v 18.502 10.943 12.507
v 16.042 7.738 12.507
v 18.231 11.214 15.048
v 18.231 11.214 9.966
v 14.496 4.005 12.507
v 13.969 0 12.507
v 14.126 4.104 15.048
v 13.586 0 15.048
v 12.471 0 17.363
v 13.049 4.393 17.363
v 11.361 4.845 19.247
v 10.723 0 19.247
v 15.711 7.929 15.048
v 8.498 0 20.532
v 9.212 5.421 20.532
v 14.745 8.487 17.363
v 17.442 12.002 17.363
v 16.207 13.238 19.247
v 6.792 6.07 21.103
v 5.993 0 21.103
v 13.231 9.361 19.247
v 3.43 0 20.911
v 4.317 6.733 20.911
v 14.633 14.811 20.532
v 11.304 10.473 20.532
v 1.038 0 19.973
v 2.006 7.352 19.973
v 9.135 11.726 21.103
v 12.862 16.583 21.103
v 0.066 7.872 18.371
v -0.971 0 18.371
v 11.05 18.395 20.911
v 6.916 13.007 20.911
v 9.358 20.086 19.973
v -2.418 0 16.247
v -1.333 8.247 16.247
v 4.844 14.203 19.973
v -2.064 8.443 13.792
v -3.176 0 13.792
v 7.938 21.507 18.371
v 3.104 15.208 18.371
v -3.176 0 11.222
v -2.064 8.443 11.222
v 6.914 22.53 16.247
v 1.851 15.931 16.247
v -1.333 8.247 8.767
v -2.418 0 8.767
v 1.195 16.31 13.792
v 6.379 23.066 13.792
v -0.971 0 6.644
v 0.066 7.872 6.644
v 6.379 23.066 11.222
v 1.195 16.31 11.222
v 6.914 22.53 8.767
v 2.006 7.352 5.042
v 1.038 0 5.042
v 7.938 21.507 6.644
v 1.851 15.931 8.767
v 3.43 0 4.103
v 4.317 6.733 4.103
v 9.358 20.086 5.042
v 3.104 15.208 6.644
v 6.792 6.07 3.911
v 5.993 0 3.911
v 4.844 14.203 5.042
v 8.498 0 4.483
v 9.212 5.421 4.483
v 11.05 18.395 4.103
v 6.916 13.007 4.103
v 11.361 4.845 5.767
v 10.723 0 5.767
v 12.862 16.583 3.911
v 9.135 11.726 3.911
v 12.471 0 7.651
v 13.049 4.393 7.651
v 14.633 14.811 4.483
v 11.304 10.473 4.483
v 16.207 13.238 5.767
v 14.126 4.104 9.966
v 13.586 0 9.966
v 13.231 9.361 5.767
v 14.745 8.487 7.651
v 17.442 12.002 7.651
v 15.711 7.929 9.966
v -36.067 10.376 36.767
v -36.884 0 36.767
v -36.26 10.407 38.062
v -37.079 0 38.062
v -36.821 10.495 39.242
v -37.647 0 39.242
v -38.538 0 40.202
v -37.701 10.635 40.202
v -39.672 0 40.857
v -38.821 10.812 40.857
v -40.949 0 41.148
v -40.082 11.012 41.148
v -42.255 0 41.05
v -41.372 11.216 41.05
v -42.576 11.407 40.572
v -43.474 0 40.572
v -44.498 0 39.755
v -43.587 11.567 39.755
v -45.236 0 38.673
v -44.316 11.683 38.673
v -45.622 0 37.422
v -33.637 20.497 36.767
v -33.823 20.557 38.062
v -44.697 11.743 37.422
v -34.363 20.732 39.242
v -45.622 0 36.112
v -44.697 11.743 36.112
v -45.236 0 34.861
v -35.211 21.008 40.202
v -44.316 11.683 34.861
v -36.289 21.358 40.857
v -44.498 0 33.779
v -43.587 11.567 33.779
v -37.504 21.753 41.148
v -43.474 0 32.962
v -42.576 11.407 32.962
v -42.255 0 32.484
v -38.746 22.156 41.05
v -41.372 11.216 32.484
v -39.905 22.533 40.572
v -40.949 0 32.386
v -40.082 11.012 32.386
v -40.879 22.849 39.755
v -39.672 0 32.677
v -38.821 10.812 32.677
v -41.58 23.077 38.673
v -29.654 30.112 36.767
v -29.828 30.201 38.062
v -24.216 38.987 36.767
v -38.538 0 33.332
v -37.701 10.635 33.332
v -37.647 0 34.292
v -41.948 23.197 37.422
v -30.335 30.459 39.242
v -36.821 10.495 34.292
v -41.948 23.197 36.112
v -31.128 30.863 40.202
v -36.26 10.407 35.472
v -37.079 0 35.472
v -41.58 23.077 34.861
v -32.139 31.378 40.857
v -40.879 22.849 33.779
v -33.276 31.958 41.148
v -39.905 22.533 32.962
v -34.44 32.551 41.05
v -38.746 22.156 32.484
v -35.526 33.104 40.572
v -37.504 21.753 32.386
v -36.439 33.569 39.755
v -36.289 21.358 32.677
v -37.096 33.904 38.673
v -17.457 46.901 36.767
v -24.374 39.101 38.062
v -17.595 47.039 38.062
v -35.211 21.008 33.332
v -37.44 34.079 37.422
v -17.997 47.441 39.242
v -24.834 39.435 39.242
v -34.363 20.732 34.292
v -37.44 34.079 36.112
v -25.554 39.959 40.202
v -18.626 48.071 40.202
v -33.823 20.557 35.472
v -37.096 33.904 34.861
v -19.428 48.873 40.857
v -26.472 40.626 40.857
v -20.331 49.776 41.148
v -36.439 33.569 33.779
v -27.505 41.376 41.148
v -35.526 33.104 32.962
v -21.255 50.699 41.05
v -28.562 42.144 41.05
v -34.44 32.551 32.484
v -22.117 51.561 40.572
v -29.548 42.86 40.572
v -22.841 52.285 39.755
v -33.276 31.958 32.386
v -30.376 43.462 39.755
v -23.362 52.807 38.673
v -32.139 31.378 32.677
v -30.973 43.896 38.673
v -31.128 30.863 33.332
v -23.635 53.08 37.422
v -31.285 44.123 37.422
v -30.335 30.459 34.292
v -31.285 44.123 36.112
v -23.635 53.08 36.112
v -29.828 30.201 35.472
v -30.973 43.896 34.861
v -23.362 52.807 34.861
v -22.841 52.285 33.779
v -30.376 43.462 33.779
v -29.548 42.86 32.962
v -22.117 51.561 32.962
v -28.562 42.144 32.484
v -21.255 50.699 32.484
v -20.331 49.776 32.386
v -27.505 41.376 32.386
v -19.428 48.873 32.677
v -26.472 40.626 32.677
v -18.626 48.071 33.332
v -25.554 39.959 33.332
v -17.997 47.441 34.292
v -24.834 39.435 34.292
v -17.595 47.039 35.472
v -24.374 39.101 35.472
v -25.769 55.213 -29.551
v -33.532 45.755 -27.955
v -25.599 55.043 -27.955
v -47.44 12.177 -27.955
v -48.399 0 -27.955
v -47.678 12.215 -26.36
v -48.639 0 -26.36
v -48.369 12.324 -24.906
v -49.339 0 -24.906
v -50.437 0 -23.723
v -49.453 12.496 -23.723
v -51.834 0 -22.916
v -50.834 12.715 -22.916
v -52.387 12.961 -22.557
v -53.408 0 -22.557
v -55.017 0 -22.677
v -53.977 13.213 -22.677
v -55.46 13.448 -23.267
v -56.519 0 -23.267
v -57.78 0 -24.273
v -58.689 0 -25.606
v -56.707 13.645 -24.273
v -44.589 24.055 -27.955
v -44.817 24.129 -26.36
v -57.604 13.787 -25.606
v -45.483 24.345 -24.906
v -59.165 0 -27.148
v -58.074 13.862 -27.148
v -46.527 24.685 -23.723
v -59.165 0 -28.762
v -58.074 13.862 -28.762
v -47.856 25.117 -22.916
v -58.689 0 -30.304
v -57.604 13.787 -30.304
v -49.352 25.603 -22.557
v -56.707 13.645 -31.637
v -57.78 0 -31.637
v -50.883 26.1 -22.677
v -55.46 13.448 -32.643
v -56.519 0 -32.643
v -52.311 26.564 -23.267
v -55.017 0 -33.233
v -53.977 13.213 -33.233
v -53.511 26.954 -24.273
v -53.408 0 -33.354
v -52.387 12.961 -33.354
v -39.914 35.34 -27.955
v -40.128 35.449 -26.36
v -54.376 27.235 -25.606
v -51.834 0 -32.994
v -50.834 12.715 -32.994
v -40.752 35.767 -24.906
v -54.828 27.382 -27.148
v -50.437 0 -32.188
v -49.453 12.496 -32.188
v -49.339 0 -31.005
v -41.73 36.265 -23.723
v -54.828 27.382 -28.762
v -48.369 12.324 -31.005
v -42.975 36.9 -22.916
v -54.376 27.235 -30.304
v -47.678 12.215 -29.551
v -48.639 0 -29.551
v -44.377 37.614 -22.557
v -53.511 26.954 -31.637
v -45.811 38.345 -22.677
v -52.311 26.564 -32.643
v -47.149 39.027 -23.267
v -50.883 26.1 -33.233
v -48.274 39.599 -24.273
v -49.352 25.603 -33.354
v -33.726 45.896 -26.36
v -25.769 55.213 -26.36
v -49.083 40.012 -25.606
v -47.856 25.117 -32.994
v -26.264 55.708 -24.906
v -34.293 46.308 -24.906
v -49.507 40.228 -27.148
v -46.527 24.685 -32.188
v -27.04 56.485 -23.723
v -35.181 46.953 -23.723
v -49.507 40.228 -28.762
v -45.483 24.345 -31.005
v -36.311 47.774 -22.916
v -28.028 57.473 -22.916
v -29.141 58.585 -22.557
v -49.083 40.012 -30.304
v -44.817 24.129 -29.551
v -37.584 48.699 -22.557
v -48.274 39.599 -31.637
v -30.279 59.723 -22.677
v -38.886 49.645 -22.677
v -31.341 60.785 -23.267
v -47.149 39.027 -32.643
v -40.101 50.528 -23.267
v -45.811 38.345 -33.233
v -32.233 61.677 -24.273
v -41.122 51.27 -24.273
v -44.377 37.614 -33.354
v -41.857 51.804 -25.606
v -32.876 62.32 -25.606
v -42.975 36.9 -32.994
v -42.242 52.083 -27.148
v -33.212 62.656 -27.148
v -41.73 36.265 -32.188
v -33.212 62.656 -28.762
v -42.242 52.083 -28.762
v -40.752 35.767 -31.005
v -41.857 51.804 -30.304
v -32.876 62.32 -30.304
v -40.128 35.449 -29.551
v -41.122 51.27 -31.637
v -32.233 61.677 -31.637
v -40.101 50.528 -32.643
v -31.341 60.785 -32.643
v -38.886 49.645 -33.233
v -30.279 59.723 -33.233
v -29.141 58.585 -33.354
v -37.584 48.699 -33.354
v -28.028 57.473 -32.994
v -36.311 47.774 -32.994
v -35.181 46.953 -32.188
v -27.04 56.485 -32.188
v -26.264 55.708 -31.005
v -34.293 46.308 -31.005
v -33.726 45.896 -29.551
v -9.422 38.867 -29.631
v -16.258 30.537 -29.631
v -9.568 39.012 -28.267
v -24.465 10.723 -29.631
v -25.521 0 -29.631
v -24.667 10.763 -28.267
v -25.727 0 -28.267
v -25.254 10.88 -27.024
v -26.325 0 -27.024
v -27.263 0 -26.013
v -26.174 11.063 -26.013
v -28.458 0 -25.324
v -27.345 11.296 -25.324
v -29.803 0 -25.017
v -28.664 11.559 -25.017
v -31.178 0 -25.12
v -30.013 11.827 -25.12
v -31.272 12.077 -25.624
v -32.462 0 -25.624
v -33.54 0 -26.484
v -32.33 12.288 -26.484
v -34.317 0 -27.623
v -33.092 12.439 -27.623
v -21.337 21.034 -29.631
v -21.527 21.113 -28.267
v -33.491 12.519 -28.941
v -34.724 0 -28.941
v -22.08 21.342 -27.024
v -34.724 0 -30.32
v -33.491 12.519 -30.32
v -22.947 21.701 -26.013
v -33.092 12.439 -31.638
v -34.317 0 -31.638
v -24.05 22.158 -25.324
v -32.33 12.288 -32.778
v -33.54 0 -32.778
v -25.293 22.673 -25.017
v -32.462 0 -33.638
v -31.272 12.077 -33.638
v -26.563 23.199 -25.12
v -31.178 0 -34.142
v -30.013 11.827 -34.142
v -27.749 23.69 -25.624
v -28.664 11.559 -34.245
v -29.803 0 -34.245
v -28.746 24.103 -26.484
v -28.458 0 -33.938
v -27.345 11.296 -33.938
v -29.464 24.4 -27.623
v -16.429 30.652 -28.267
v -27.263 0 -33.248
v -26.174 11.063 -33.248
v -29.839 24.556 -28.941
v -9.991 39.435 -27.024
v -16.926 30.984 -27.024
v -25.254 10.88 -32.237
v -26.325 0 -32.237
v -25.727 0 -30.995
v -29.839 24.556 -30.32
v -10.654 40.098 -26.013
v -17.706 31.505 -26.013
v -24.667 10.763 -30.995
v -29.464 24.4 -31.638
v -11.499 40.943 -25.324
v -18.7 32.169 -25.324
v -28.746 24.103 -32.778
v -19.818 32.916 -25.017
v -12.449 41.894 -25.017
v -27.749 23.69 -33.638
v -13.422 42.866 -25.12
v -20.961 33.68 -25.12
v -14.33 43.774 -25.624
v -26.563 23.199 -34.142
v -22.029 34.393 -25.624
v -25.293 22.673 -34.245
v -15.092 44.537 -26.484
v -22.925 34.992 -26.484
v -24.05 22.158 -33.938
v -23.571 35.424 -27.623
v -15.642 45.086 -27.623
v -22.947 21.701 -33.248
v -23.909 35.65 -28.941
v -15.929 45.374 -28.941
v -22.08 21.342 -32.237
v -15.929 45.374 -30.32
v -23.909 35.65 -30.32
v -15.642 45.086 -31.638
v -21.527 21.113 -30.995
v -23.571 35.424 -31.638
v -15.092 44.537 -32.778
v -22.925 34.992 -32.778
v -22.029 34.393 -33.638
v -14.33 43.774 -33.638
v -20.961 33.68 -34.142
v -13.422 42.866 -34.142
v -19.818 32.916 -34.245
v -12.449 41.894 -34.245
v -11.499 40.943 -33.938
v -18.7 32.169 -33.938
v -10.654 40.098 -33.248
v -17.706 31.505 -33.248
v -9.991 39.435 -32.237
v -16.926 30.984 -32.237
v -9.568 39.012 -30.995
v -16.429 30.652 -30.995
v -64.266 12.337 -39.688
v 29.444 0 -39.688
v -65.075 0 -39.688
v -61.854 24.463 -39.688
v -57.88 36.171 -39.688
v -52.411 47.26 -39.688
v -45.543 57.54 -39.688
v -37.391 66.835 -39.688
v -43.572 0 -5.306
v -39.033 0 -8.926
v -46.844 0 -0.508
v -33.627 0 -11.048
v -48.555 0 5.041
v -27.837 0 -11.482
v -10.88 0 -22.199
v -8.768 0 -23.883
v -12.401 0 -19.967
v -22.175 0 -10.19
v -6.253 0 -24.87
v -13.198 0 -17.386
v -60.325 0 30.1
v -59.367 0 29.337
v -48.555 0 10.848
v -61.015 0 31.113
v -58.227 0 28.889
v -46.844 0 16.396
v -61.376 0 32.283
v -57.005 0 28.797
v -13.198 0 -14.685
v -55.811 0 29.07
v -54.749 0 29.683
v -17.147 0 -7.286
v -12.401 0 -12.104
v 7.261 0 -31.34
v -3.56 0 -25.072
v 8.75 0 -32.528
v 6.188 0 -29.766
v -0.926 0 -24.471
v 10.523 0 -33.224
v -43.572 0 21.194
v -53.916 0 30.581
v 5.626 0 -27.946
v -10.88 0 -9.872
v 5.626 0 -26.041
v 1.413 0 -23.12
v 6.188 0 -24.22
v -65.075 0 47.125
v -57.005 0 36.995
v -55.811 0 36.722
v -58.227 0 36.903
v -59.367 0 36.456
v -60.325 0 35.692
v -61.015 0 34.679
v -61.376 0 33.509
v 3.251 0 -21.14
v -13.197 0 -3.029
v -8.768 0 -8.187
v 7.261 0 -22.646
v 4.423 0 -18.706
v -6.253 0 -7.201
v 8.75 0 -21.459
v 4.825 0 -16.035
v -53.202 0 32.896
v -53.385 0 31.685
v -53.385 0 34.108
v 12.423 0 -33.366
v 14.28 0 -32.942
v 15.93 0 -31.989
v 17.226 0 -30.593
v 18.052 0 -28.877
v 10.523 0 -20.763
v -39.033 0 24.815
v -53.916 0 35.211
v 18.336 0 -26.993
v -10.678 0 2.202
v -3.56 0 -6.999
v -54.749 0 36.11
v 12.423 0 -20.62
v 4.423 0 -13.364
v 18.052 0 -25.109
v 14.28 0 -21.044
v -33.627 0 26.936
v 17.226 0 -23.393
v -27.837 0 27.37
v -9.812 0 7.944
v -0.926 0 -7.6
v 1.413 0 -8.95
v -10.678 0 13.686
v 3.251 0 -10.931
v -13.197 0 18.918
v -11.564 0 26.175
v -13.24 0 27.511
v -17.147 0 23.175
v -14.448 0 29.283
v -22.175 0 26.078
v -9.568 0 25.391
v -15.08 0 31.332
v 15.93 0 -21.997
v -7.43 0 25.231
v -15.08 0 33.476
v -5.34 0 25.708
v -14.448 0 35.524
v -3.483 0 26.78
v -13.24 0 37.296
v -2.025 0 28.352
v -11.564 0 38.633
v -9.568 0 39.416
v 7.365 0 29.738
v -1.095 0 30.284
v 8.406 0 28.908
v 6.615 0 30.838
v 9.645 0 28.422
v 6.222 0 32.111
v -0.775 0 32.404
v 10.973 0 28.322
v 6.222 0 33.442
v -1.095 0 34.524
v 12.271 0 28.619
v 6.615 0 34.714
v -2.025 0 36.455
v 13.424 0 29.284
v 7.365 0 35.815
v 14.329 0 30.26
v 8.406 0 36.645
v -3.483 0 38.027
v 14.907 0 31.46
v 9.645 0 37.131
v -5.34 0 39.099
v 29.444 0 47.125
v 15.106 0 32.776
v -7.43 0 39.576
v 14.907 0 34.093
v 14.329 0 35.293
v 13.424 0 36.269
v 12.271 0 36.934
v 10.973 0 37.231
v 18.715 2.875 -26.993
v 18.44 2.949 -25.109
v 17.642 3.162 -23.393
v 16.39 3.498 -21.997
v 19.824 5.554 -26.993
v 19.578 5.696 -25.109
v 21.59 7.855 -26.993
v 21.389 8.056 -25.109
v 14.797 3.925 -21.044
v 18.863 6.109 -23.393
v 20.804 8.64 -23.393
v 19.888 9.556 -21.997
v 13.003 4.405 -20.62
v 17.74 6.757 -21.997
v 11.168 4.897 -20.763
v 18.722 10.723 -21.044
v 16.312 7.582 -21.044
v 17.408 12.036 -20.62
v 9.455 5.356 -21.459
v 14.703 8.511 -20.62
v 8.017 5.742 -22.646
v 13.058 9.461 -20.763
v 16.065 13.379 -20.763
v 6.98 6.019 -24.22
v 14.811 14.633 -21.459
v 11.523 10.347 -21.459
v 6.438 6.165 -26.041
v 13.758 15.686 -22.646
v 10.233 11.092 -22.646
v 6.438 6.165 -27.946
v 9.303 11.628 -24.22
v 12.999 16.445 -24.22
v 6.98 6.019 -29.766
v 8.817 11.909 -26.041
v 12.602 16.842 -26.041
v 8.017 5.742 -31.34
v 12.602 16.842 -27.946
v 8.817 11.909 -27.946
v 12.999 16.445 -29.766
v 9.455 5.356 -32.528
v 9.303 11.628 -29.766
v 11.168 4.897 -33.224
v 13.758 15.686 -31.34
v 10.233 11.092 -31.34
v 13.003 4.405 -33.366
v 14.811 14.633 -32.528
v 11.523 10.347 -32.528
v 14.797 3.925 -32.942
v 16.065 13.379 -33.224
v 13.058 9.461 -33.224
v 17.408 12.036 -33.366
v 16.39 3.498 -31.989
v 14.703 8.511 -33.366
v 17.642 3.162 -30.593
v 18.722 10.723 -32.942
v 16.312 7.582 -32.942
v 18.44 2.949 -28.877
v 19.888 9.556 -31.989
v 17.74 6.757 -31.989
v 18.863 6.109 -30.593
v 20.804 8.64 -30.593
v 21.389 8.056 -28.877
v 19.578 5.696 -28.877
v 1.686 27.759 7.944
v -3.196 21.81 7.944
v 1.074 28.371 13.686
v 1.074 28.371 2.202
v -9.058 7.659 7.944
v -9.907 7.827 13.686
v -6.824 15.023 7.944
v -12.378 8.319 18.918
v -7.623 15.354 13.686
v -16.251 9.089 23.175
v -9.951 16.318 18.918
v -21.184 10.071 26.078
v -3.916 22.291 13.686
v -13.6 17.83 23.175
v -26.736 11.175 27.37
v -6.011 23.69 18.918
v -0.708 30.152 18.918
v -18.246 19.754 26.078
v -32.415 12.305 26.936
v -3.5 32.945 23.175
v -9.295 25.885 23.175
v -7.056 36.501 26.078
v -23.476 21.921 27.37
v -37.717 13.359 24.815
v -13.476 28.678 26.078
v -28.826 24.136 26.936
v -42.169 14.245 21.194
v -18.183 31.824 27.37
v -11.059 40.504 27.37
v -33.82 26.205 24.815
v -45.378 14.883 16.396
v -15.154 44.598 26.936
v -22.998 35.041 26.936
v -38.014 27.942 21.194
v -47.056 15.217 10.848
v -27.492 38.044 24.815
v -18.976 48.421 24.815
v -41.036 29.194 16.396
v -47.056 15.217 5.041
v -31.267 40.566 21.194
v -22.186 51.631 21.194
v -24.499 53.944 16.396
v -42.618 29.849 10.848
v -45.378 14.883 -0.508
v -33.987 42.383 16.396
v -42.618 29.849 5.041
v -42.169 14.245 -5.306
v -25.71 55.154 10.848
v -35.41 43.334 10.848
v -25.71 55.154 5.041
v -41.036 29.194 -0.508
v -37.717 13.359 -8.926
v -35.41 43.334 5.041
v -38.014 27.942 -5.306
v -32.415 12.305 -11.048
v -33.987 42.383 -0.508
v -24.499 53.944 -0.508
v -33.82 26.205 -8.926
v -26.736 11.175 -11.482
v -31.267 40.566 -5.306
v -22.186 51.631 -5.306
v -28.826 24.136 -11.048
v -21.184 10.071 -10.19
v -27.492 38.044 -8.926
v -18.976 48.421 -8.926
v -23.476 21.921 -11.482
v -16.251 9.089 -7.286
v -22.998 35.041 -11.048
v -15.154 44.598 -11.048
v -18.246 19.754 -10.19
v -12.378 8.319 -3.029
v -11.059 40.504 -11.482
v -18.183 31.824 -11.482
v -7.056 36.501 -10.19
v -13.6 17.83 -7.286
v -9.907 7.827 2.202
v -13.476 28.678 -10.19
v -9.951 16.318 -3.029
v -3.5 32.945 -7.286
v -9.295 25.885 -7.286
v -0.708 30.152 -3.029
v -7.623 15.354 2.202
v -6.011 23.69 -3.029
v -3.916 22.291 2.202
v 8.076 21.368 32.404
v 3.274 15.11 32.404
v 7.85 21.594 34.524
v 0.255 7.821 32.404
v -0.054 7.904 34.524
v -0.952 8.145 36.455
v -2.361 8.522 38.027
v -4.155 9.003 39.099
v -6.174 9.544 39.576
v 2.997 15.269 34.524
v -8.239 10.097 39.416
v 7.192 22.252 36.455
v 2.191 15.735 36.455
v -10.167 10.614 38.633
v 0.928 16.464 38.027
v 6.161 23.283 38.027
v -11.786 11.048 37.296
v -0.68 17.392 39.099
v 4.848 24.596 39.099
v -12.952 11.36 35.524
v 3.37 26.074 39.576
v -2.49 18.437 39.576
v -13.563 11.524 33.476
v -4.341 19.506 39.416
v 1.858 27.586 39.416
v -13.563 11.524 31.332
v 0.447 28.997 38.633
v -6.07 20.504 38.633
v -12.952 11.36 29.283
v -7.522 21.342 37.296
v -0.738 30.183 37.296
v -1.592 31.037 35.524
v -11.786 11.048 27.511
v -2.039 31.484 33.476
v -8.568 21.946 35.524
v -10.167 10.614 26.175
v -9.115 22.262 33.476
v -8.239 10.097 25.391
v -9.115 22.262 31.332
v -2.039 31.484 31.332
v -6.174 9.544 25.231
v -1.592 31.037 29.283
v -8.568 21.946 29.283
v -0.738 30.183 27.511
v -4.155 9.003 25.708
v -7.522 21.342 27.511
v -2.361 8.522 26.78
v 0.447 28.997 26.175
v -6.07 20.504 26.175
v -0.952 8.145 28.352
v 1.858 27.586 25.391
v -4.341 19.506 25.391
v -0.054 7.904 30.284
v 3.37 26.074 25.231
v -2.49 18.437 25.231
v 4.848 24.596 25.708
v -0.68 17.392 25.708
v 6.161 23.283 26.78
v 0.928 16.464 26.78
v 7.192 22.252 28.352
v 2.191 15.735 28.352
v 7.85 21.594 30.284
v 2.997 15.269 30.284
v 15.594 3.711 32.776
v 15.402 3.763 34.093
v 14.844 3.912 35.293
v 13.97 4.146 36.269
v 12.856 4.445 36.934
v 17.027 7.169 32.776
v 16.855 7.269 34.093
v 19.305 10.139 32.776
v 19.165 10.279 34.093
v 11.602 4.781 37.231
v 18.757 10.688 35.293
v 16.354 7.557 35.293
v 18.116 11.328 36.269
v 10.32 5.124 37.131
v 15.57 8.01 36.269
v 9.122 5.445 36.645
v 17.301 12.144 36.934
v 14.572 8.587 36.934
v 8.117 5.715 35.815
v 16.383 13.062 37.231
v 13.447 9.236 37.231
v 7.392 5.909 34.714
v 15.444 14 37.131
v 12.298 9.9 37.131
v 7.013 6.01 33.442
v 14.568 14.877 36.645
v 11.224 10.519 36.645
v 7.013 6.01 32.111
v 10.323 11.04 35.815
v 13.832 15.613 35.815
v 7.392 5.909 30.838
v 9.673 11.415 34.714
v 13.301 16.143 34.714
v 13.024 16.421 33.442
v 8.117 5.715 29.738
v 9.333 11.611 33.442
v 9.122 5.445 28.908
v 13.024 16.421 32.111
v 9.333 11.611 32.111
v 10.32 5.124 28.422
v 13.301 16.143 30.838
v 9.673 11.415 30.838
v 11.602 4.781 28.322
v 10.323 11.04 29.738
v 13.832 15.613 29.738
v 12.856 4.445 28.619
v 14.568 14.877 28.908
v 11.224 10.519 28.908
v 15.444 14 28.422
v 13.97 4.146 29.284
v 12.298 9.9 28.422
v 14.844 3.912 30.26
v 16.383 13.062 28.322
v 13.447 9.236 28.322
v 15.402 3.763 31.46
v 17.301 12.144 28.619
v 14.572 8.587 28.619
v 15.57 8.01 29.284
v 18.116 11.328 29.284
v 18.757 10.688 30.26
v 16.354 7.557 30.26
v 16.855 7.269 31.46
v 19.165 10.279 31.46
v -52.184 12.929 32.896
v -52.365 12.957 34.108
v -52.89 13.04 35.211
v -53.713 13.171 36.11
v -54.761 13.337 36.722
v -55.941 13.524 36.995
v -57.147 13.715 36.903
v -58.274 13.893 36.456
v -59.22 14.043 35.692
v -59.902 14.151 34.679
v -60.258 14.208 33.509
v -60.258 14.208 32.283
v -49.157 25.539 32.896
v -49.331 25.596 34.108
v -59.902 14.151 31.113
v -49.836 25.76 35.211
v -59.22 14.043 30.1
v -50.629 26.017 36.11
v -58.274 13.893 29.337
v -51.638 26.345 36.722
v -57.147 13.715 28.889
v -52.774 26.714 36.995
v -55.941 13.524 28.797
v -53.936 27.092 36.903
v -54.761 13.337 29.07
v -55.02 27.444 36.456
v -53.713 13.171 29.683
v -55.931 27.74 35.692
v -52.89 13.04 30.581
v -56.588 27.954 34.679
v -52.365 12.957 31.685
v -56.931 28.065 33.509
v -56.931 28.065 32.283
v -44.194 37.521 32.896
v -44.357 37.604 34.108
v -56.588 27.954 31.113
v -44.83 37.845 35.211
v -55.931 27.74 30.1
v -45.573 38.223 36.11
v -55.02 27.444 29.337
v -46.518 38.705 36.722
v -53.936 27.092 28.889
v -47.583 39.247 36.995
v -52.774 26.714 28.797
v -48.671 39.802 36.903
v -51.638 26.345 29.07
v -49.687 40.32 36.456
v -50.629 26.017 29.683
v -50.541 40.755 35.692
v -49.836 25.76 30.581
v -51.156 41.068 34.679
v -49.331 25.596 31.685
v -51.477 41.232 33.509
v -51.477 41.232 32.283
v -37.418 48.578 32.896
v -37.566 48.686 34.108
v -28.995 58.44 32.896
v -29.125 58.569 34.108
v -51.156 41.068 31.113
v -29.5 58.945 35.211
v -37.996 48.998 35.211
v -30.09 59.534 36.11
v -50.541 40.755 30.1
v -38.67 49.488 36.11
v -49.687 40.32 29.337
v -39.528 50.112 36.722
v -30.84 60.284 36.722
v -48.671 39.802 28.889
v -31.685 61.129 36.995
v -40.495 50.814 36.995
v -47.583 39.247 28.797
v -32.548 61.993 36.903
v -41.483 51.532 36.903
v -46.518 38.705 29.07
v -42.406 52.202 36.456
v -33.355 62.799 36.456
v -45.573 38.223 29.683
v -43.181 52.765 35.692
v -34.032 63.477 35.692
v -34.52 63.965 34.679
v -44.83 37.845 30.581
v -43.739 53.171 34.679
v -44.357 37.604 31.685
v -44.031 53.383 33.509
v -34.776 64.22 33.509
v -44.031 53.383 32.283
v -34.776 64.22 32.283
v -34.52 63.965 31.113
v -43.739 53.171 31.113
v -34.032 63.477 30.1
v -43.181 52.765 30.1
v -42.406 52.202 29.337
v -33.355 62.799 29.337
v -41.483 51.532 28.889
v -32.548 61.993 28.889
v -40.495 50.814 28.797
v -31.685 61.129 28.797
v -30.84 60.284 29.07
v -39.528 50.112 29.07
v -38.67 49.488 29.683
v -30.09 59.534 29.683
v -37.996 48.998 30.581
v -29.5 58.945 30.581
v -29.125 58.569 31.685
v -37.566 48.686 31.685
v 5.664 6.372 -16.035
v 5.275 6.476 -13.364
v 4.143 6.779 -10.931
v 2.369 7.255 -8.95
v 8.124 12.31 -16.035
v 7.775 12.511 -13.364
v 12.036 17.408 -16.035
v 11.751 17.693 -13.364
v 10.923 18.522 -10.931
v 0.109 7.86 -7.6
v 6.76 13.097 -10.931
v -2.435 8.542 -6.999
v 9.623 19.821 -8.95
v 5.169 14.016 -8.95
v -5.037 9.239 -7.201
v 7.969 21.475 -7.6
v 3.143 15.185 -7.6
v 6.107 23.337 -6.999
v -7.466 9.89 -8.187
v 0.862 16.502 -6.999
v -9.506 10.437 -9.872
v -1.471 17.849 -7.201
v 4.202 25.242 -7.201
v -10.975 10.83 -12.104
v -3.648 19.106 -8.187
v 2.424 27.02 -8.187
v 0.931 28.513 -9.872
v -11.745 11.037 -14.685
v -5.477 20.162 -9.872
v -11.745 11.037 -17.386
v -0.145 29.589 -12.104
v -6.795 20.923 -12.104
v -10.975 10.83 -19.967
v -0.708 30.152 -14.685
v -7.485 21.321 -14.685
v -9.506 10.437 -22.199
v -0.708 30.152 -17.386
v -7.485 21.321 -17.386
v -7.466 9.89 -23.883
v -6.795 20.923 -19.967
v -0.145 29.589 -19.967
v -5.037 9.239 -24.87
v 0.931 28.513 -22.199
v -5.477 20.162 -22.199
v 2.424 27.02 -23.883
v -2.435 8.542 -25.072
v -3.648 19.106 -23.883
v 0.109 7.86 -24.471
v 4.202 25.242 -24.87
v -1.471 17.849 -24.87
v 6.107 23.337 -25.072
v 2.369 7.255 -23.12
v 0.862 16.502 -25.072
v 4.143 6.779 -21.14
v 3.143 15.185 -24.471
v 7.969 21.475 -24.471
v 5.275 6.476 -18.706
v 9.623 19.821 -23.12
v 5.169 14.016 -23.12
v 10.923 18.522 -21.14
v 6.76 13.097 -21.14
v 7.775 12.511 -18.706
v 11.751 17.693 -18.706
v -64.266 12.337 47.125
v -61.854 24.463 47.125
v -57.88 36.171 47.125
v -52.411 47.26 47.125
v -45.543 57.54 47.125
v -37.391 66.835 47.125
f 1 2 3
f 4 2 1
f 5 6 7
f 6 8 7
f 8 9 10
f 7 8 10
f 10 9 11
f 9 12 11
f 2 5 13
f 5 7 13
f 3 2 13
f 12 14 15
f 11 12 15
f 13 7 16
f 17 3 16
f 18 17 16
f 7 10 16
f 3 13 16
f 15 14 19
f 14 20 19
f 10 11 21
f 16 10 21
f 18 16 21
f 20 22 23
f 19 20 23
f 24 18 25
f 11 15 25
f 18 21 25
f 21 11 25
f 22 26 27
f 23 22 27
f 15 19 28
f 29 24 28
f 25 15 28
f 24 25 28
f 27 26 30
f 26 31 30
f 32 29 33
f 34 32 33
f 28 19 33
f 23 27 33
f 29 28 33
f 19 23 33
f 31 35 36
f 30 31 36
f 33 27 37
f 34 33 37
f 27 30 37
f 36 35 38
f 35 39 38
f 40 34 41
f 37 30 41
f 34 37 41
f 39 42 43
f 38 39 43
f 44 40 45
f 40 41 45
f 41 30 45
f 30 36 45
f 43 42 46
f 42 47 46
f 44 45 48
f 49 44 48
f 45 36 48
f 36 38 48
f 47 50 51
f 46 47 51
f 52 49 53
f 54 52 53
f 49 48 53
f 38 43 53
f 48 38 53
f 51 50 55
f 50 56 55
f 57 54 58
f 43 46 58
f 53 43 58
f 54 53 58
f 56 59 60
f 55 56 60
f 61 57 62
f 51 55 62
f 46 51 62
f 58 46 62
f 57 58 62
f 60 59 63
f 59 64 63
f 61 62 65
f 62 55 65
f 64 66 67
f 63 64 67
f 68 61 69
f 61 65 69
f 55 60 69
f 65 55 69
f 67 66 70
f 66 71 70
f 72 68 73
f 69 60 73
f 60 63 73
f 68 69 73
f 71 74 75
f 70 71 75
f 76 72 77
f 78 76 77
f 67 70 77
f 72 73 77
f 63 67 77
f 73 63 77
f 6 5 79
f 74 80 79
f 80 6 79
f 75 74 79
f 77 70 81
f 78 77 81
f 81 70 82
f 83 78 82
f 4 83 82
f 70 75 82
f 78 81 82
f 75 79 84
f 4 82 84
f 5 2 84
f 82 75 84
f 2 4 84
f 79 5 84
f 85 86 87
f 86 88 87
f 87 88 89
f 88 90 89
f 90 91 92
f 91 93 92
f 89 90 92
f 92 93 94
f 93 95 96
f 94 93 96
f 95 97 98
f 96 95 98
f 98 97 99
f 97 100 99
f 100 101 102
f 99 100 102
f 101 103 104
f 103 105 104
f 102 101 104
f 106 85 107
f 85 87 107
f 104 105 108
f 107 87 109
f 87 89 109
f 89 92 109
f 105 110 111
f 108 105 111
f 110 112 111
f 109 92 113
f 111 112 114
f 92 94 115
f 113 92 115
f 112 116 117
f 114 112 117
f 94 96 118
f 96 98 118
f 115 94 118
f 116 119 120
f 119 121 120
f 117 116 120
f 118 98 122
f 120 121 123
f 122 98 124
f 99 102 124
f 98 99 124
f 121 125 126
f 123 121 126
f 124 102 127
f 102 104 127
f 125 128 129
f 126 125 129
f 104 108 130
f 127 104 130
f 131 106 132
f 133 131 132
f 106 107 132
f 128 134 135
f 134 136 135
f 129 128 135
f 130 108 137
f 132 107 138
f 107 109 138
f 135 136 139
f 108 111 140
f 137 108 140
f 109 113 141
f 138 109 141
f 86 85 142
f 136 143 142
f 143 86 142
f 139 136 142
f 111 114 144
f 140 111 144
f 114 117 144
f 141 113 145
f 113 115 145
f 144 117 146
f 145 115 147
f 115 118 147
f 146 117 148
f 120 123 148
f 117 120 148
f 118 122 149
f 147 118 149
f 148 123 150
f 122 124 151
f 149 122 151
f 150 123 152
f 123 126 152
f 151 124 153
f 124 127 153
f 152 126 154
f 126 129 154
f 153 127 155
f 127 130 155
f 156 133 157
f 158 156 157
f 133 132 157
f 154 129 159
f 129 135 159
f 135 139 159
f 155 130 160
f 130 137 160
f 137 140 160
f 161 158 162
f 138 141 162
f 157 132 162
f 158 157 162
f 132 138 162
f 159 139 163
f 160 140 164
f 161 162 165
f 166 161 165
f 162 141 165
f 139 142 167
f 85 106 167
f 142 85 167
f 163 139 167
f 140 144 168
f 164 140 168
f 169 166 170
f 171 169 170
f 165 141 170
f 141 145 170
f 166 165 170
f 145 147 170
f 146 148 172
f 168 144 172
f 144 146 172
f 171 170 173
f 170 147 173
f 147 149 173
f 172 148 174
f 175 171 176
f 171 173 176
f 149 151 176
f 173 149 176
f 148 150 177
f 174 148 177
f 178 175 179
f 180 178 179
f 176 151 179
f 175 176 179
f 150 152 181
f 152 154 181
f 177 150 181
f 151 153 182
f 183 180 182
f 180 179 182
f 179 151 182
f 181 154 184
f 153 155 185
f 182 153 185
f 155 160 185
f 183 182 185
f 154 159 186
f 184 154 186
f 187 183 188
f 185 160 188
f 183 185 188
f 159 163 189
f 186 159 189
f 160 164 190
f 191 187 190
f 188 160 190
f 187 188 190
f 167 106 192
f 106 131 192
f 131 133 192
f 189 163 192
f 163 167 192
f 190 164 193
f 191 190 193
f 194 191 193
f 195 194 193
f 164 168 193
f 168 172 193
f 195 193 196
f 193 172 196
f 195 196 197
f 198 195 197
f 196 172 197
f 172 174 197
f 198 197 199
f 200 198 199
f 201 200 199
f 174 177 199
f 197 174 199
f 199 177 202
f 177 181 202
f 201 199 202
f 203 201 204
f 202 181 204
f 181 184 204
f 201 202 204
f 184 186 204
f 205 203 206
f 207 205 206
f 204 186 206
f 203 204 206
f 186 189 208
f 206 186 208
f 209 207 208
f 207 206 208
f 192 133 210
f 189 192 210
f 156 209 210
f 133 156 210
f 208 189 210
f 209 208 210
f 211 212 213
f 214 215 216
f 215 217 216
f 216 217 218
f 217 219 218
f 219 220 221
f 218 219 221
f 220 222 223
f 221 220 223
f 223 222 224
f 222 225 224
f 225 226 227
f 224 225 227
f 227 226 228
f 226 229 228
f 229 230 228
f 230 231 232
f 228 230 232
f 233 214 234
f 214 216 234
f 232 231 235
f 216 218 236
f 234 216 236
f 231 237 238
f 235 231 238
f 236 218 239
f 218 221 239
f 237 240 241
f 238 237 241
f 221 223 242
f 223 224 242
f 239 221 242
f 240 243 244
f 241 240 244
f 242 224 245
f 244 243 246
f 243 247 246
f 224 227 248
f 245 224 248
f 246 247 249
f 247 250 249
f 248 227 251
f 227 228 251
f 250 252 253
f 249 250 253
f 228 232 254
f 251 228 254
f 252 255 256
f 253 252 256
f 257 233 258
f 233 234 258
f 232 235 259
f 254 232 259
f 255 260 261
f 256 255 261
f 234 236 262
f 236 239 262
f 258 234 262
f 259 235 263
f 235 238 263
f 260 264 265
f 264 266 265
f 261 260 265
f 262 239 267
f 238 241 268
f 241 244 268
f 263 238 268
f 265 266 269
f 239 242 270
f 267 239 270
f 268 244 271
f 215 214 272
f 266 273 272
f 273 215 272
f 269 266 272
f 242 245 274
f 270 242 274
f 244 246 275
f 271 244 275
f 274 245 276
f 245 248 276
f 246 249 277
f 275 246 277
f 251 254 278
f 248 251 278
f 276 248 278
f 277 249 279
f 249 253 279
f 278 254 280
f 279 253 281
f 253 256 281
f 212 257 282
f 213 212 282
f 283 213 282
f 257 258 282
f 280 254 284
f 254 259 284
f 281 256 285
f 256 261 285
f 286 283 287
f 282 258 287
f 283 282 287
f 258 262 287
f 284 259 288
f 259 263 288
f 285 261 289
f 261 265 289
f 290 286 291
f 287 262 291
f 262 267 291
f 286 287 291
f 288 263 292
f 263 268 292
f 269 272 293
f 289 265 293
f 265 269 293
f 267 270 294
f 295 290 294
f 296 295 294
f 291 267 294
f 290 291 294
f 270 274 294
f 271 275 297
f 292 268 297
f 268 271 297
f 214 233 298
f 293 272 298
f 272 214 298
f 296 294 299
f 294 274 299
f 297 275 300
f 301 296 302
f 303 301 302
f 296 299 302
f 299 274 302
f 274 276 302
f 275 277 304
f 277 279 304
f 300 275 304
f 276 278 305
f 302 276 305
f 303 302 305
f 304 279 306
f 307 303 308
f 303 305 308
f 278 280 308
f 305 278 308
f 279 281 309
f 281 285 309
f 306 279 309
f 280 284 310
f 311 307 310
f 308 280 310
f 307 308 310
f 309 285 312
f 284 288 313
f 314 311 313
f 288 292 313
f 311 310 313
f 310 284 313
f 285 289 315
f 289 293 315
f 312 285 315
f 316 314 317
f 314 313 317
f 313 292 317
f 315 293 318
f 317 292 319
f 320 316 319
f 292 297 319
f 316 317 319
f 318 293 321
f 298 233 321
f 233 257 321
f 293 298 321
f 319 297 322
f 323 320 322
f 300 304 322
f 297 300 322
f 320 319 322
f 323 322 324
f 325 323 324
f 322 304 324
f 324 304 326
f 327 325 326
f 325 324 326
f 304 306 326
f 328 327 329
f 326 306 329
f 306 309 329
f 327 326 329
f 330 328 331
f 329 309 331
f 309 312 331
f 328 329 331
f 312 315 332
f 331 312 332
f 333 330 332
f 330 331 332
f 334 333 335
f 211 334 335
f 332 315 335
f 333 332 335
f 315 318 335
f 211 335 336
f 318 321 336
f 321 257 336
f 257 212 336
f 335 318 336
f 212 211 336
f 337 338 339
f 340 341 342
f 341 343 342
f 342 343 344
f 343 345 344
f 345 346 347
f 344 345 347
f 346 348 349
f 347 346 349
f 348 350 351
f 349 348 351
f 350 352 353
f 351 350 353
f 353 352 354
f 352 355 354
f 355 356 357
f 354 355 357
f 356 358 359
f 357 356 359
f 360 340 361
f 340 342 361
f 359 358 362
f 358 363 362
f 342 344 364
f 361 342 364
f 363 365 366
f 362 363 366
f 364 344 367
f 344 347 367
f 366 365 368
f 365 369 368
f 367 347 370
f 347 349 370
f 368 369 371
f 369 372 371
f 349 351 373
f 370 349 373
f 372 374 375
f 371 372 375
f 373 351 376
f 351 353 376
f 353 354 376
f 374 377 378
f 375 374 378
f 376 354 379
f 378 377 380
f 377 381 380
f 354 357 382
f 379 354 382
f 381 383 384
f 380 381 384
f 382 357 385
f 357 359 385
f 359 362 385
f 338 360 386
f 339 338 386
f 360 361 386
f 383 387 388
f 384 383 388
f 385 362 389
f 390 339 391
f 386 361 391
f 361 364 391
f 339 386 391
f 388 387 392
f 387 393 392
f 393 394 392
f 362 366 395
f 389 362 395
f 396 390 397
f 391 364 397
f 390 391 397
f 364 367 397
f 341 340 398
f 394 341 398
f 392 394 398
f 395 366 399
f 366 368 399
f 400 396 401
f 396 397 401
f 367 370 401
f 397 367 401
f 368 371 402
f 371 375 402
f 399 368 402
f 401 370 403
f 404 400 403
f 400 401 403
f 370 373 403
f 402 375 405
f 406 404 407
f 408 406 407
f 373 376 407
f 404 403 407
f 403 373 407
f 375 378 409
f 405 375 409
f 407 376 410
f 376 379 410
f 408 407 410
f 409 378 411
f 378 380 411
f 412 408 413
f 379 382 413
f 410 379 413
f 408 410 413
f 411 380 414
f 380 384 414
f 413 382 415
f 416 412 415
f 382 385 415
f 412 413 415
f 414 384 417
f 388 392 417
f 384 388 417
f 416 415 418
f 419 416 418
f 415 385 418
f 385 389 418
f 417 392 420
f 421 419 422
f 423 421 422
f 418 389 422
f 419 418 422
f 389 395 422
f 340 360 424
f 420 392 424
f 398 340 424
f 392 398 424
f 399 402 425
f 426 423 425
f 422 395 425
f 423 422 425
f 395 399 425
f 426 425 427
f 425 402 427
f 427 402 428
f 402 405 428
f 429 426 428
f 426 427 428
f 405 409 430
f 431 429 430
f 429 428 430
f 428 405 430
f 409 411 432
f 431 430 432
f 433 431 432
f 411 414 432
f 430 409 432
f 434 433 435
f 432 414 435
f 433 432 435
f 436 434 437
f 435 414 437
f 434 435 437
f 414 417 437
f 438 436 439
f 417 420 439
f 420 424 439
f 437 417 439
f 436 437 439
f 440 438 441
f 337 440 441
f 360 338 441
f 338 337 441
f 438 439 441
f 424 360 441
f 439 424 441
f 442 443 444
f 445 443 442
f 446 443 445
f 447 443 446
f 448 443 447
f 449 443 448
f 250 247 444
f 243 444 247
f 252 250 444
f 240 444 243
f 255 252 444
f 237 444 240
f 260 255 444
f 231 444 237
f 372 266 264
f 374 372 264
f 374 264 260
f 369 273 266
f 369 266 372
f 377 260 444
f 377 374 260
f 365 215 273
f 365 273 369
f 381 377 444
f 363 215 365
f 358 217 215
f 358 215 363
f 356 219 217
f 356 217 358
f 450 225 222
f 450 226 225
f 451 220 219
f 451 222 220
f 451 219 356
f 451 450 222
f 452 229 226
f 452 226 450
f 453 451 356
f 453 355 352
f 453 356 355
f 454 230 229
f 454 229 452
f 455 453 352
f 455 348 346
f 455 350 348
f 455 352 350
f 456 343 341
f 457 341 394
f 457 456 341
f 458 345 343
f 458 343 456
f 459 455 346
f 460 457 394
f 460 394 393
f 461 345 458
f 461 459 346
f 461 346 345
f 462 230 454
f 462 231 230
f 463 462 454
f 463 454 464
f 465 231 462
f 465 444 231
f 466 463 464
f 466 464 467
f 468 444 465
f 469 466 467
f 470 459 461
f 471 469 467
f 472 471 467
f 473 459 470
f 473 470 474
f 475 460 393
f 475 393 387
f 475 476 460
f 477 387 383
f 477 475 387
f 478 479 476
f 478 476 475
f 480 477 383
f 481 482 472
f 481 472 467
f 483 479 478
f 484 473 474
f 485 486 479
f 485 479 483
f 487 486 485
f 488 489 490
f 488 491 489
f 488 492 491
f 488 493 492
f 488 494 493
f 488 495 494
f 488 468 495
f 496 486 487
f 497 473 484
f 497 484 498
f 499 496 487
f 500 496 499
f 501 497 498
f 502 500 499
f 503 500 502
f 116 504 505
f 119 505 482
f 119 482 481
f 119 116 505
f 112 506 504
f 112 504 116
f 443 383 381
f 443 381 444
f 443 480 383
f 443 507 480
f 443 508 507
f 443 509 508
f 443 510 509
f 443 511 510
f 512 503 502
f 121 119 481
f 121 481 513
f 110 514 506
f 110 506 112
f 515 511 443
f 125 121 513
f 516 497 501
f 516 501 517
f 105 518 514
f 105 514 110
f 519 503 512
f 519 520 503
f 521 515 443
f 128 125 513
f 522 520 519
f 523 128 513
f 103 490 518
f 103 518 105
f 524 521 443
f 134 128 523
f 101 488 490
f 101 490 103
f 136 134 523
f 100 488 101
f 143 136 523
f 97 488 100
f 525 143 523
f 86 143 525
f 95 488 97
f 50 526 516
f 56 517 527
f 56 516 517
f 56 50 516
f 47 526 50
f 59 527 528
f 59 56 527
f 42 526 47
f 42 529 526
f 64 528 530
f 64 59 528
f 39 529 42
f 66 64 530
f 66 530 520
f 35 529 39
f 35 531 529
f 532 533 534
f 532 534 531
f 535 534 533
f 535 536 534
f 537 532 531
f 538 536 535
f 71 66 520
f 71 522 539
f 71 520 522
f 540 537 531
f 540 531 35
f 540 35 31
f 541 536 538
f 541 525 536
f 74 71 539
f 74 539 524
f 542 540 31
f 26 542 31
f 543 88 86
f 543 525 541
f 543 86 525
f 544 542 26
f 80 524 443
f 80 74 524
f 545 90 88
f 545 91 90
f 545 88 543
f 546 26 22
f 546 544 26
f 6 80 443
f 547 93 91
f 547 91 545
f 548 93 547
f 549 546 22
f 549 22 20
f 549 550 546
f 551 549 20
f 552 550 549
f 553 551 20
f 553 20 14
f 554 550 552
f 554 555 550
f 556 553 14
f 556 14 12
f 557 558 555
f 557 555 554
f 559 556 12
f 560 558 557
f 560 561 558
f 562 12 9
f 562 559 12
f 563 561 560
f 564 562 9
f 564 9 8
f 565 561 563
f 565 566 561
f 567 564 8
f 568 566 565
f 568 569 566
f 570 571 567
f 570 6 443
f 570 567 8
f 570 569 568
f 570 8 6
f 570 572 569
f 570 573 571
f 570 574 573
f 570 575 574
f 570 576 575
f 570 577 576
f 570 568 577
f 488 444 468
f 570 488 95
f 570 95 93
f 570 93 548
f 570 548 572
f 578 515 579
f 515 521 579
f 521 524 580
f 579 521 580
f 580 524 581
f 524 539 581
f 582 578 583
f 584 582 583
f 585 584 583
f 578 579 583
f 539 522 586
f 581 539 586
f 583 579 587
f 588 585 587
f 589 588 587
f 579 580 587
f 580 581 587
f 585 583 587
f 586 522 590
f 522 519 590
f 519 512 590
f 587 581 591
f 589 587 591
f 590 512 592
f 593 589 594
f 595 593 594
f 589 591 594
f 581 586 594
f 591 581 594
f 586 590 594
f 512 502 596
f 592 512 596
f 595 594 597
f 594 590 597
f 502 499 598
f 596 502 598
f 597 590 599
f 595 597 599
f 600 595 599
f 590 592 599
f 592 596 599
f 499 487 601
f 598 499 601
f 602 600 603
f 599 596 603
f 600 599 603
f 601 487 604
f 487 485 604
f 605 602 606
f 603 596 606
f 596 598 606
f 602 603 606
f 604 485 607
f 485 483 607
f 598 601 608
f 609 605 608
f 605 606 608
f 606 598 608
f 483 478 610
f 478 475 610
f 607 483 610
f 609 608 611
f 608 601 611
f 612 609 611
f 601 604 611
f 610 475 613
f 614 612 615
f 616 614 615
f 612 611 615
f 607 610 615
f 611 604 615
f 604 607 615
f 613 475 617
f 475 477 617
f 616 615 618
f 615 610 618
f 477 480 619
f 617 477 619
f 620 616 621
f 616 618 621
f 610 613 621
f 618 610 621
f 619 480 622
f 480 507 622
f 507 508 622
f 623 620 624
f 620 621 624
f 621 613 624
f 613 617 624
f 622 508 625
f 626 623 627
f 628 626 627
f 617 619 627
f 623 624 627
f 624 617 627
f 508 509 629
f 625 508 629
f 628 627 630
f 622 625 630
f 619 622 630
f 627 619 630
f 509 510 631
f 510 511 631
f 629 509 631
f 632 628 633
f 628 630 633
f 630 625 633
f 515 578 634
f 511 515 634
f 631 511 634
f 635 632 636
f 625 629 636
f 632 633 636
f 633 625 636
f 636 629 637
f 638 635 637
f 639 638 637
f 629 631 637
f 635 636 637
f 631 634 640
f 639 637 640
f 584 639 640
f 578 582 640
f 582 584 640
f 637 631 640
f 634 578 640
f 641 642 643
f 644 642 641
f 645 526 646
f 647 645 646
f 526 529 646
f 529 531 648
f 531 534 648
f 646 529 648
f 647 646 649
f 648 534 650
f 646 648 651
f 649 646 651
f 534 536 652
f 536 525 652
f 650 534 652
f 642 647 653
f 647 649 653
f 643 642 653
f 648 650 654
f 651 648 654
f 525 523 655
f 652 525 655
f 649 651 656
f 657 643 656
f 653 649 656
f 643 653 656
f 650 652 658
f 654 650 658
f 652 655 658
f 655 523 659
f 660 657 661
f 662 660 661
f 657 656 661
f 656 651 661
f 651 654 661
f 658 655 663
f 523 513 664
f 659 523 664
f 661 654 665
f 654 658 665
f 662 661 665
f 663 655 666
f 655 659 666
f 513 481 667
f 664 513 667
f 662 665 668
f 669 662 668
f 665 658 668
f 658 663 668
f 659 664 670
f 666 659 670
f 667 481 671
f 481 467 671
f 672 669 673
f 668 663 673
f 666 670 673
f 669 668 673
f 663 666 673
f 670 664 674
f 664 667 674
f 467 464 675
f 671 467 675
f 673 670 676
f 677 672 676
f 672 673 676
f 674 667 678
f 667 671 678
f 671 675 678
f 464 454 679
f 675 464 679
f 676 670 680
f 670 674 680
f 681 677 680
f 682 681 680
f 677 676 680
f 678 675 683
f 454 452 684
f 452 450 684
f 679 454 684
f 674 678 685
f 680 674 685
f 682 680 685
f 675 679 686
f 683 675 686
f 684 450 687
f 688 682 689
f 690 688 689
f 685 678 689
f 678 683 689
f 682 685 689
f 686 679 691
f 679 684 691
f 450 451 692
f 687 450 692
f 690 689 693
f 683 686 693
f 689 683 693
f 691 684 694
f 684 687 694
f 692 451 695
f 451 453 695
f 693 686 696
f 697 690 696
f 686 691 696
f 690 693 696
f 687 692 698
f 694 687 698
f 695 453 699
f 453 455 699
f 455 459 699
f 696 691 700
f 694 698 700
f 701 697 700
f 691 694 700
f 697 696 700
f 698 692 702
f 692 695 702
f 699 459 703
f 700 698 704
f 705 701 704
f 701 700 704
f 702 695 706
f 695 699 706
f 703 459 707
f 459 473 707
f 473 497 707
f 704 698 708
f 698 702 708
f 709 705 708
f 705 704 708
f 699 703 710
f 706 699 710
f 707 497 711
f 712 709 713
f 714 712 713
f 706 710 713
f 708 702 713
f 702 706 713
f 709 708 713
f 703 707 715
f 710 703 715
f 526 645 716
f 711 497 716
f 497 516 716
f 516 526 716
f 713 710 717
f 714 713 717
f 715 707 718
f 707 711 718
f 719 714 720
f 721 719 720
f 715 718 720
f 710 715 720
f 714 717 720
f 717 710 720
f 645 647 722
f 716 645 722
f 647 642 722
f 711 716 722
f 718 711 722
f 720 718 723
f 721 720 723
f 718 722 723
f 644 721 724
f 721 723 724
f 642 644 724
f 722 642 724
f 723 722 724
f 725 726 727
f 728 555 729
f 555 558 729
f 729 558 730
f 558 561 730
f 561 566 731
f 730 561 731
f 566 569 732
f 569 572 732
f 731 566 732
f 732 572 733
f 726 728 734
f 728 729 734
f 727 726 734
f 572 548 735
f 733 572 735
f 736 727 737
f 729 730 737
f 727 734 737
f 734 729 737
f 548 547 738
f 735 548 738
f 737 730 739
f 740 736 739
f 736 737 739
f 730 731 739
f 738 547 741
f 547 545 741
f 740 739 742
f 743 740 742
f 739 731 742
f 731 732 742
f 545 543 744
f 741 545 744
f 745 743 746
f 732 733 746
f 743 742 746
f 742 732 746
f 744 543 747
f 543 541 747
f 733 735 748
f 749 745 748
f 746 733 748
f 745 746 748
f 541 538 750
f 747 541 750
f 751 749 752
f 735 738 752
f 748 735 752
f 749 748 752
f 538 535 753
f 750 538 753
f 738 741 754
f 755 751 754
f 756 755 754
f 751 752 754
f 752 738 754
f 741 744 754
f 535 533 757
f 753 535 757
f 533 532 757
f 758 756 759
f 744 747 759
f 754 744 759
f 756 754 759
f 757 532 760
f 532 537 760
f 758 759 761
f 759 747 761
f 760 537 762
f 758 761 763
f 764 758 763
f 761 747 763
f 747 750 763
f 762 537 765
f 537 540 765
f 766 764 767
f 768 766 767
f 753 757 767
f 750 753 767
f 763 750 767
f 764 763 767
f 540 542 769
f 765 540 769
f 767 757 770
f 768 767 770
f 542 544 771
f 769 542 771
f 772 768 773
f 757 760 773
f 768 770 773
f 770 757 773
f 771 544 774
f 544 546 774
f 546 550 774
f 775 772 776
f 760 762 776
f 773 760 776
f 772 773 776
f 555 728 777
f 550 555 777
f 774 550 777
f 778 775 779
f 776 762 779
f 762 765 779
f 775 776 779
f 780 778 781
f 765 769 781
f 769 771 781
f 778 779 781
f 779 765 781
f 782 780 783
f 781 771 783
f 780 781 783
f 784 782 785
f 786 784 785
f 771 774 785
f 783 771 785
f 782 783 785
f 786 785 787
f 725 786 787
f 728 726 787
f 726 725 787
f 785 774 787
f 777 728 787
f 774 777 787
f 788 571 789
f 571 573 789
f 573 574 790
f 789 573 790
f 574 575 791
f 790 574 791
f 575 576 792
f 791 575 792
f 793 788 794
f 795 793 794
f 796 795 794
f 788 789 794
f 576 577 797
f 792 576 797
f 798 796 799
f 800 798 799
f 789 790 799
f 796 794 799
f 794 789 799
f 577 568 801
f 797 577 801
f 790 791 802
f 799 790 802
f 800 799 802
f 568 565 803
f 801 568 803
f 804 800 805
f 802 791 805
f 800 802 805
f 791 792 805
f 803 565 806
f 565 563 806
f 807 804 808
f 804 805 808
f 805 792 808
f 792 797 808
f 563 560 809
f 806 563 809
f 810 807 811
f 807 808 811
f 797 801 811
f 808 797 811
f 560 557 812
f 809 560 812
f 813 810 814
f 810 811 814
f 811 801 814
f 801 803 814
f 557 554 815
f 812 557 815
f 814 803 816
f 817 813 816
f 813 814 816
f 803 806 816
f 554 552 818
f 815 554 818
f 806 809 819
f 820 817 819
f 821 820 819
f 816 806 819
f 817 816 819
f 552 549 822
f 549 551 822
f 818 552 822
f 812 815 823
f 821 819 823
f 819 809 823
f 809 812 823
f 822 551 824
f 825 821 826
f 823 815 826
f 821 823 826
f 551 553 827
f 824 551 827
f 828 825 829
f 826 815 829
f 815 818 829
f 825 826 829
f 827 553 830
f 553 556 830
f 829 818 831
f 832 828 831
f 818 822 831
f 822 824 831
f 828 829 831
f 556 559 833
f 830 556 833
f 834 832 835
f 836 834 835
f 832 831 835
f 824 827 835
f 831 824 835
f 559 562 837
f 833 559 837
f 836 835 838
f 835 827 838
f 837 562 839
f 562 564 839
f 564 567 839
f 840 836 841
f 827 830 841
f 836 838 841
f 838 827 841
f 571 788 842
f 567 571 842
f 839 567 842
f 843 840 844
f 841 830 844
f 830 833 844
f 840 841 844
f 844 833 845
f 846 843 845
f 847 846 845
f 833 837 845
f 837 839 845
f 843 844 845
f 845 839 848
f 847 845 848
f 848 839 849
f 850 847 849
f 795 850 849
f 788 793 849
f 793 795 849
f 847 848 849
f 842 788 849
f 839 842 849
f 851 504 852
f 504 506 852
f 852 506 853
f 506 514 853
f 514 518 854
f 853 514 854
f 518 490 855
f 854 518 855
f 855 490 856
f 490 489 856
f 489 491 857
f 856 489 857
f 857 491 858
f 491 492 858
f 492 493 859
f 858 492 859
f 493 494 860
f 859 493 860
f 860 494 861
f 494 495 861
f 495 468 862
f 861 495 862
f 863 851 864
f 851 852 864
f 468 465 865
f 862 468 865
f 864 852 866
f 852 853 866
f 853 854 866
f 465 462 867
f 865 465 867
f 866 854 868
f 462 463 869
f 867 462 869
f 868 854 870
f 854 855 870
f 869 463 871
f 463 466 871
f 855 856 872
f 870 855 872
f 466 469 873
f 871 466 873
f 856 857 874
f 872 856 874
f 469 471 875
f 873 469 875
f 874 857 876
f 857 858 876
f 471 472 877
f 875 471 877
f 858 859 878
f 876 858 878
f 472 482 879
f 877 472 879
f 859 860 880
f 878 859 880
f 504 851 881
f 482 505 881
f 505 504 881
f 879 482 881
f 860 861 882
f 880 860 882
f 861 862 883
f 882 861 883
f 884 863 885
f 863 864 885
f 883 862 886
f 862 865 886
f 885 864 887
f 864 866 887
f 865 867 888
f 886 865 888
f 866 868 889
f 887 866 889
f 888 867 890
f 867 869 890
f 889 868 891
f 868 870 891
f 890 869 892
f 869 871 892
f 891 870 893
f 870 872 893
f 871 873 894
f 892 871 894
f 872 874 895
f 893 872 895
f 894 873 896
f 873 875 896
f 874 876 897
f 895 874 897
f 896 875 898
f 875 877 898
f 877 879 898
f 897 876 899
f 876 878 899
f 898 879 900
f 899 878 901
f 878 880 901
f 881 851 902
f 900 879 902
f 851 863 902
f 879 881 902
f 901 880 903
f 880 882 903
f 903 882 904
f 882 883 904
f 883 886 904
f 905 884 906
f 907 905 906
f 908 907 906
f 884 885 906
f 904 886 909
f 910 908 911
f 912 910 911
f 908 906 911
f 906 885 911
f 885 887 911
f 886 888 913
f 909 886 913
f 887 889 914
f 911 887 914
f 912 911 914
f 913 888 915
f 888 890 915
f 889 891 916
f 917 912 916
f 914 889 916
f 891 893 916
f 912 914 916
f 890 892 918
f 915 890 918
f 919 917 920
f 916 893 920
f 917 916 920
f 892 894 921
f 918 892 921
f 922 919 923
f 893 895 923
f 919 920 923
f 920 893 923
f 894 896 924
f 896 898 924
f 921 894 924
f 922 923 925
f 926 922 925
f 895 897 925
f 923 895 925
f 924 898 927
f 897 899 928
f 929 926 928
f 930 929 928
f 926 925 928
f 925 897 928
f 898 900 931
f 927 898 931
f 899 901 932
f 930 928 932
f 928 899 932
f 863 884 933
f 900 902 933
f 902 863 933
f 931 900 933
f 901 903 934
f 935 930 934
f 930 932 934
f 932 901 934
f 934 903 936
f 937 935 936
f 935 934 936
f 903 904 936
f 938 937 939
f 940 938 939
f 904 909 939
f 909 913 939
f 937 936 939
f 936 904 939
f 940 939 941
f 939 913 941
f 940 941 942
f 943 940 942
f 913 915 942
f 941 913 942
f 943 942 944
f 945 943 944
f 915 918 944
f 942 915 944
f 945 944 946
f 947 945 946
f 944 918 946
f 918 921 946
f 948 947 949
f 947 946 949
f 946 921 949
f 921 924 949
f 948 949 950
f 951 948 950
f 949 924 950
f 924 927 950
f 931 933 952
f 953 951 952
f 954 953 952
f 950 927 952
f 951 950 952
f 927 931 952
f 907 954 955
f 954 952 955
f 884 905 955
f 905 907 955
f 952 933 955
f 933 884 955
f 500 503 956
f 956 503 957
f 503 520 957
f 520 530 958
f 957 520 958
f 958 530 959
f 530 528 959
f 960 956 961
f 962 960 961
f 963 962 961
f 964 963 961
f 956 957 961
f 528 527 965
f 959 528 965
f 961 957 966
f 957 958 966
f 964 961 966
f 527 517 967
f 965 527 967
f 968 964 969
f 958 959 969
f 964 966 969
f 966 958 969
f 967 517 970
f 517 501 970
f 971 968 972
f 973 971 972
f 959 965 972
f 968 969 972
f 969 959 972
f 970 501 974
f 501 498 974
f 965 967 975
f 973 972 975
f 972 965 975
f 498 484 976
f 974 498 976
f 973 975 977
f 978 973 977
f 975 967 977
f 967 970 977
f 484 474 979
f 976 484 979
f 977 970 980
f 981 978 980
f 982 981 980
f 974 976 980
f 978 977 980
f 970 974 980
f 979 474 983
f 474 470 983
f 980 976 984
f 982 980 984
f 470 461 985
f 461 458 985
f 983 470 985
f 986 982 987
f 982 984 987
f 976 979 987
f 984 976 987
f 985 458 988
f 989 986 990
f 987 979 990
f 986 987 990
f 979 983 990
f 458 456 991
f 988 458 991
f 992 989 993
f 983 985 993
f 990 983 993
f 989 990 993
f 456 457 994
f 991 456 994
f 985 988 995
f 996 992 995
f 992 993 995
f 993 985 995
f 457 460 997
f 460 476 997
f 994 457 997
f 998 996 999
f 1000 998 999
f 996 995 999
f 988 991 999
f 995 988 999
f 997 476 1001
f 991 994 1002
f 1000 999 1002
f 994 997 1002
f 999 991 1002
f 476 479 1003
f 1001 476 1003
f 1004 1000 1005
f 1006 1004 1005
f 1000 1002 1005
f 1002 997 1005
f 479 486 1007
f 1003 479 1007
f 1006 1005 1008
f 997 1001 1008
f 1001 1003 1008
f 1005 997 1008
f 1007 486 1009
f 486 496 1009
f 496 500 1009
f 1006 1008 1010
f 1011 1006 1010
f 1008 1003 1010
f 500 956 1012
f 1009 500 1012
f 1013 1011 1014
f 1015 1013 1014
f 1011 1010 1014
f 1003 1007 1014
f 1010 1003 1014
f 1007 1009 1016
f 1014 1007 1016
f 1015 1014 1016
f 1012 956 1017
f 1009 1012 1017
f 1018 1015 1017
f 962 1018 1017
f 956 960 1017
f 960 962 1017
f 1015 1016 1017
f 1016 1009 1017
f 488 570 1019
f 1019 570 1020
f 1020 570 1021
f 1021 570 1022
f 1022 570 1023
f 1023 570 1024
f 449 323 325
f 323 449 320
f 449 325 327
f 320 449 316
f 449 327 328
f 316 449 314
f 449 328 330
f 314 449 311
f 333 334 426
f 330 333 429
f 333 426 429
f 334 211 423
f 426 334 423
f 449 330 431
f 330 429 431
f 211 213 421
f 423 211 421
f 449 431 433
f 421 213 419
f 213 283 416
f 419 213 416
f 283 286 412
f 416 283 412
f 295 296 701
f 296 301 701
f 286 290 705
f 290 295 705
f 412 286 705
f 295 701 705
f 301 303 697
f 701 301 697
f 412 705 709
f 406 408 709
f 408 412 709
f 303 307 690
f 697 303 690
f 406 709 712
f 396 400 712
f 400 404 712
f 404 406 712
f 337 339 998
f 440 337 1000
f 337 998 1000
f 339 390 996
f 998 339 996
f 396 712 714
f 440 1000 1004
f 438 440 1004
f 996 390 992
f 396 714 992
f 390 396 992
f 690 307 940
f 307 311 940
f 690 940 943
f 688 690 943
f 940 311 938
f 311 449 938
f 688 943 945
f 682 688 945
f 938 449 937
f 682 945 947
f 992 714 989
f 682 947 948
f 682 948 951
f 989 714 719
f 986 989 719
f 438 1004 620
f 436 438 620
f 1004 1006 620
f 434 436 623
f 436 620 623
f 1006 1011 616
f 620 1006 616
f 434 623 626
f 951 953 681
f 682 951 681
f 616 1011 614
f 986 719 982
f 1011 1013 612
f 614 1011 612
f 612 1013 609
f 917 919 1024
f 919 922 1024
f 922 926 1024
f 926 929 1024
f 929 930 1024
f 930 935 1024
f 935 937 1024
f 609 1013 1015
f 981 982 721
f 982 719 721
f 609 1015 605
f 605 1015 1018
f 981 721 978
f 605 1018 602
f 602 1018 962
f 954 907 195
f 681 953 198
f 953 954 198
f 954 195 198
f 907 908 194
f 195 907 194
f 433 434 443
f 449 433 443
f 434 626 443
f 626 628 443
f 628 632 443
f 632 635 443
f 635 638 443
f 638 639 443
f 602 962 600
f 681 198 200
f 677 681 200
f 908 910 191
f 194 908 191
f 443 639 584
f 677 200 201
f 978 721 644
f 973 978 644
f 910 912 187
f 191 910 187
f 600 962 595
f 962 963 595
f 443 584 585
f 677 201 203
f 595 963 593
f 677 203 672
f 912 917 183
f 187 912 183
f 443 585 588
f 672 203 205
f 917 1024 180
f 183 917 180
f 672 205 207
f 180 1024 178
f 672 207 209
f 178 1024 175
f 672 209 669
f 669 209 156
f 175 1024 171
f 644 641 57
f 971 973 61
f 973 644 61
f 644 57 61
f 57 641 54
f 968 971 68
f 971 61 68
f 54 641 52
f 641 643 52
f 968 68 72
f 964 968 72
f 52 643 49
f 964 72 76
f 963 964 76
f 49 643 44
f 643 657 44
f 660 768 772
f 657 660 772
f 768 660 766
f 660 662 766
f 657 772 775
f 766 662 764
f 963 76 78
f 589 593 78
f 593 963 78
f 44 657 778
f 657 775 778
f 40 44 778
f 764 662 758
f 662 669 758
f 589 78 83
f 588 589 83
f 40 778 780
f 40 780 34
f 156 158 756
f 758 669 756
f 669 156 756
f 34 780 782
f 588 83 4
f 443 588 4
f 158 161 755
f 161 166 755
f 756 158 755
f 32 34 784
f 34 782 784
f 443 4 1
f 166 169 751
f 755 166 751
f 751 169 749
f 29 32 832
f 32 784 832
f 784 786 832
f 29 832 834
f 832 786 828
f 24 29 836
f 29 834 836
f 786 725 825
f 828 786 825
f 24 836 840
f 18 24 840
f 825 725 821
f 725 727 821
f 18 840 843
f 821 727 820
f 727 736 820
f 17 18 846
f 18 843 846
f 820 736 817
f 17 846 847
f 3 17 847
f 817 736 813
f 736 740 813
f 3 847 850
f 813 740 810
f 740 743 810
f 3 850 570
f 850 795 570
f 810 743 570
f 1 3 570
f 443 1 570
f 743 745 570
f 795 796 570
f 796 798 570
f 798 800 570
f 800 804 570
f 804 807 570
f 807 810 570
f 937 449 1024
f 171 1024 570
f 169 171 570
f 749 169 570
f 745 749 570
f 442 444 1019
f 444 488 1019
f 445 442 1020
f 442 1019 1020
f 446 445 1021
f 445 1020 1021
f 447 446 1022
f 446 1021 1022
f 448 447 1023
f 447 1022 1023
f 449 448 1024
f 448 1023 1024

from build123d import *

# Parameters (mm, degrees)
F0_W     = 94.519034
F0_H     = 86.812686
F0_R     = 5.413518
F0_R_2   = 4.626995
F0_R_3   = 6.390639
F0_R_4   = 9.062056
F0_R_5   = 19.480322
F0_R_6   = 4.110136
F0_R_7   = 4.393433
F0_R_8   = 8.620442
F0_R_9   = 7.192681
F0_R_10  = 4.466697
F1_ANGLE = 45


with BuildPart() as f1:
    # F0 (on Front) → F1 (revolve)
    with BuildSketch(Plane.XZ):
        with Locations((-17.815083, 3.718389)):
            Rectangle(F0_W, F0_H)
        with Locations((-53.812075, -27.955186)):
            Circle(F0_R, mode=Mode.SUBTRACT)
        with Locations((-30.148292, -29.630704)):
            Circle(F0_R_2, mode=Mode.SUBTRACT)
        with Locations((11.945384, -26.993094)):
            Circle(F0_R_3, mode=Mode.SUBTRACT)
        with Locations((-4.236709, -16.035384)):
            Circle(F0_R_4, mode=Mode.SUBTRACT)
        with Locations((-29.292393, 7.944192)):
            Circle(F0_R_5, mode=Mode.SUBTRACT)
        with Locations((-57.312123, 32.896079)):
            Circle(F0_R_6, mode=Mode.SUBTRACT)
        with Locations((-41.277222, 36.766876)):
            Circle(F0_R_7, mode=Mode.SUBTRACT)
        with Locations((5.348549, 12.50712)):
            Circle(F0_R_8, mode=Mode.SUBTRACT)
        with Locations((-7.967654, 32.40367)):
            Circle(F0_R_9, mode=Mode.SUBTRACT)
        with Locations((10.63888, 32.776453)):
            Circle(F0_R_10, mode=Mode.SUBTRACT)
    revolve(axis=Axis((29.444434, 0, 3.718389), (0, 0, -1)), revolution_arc=F1_ANGLE)


solid = f1.part
